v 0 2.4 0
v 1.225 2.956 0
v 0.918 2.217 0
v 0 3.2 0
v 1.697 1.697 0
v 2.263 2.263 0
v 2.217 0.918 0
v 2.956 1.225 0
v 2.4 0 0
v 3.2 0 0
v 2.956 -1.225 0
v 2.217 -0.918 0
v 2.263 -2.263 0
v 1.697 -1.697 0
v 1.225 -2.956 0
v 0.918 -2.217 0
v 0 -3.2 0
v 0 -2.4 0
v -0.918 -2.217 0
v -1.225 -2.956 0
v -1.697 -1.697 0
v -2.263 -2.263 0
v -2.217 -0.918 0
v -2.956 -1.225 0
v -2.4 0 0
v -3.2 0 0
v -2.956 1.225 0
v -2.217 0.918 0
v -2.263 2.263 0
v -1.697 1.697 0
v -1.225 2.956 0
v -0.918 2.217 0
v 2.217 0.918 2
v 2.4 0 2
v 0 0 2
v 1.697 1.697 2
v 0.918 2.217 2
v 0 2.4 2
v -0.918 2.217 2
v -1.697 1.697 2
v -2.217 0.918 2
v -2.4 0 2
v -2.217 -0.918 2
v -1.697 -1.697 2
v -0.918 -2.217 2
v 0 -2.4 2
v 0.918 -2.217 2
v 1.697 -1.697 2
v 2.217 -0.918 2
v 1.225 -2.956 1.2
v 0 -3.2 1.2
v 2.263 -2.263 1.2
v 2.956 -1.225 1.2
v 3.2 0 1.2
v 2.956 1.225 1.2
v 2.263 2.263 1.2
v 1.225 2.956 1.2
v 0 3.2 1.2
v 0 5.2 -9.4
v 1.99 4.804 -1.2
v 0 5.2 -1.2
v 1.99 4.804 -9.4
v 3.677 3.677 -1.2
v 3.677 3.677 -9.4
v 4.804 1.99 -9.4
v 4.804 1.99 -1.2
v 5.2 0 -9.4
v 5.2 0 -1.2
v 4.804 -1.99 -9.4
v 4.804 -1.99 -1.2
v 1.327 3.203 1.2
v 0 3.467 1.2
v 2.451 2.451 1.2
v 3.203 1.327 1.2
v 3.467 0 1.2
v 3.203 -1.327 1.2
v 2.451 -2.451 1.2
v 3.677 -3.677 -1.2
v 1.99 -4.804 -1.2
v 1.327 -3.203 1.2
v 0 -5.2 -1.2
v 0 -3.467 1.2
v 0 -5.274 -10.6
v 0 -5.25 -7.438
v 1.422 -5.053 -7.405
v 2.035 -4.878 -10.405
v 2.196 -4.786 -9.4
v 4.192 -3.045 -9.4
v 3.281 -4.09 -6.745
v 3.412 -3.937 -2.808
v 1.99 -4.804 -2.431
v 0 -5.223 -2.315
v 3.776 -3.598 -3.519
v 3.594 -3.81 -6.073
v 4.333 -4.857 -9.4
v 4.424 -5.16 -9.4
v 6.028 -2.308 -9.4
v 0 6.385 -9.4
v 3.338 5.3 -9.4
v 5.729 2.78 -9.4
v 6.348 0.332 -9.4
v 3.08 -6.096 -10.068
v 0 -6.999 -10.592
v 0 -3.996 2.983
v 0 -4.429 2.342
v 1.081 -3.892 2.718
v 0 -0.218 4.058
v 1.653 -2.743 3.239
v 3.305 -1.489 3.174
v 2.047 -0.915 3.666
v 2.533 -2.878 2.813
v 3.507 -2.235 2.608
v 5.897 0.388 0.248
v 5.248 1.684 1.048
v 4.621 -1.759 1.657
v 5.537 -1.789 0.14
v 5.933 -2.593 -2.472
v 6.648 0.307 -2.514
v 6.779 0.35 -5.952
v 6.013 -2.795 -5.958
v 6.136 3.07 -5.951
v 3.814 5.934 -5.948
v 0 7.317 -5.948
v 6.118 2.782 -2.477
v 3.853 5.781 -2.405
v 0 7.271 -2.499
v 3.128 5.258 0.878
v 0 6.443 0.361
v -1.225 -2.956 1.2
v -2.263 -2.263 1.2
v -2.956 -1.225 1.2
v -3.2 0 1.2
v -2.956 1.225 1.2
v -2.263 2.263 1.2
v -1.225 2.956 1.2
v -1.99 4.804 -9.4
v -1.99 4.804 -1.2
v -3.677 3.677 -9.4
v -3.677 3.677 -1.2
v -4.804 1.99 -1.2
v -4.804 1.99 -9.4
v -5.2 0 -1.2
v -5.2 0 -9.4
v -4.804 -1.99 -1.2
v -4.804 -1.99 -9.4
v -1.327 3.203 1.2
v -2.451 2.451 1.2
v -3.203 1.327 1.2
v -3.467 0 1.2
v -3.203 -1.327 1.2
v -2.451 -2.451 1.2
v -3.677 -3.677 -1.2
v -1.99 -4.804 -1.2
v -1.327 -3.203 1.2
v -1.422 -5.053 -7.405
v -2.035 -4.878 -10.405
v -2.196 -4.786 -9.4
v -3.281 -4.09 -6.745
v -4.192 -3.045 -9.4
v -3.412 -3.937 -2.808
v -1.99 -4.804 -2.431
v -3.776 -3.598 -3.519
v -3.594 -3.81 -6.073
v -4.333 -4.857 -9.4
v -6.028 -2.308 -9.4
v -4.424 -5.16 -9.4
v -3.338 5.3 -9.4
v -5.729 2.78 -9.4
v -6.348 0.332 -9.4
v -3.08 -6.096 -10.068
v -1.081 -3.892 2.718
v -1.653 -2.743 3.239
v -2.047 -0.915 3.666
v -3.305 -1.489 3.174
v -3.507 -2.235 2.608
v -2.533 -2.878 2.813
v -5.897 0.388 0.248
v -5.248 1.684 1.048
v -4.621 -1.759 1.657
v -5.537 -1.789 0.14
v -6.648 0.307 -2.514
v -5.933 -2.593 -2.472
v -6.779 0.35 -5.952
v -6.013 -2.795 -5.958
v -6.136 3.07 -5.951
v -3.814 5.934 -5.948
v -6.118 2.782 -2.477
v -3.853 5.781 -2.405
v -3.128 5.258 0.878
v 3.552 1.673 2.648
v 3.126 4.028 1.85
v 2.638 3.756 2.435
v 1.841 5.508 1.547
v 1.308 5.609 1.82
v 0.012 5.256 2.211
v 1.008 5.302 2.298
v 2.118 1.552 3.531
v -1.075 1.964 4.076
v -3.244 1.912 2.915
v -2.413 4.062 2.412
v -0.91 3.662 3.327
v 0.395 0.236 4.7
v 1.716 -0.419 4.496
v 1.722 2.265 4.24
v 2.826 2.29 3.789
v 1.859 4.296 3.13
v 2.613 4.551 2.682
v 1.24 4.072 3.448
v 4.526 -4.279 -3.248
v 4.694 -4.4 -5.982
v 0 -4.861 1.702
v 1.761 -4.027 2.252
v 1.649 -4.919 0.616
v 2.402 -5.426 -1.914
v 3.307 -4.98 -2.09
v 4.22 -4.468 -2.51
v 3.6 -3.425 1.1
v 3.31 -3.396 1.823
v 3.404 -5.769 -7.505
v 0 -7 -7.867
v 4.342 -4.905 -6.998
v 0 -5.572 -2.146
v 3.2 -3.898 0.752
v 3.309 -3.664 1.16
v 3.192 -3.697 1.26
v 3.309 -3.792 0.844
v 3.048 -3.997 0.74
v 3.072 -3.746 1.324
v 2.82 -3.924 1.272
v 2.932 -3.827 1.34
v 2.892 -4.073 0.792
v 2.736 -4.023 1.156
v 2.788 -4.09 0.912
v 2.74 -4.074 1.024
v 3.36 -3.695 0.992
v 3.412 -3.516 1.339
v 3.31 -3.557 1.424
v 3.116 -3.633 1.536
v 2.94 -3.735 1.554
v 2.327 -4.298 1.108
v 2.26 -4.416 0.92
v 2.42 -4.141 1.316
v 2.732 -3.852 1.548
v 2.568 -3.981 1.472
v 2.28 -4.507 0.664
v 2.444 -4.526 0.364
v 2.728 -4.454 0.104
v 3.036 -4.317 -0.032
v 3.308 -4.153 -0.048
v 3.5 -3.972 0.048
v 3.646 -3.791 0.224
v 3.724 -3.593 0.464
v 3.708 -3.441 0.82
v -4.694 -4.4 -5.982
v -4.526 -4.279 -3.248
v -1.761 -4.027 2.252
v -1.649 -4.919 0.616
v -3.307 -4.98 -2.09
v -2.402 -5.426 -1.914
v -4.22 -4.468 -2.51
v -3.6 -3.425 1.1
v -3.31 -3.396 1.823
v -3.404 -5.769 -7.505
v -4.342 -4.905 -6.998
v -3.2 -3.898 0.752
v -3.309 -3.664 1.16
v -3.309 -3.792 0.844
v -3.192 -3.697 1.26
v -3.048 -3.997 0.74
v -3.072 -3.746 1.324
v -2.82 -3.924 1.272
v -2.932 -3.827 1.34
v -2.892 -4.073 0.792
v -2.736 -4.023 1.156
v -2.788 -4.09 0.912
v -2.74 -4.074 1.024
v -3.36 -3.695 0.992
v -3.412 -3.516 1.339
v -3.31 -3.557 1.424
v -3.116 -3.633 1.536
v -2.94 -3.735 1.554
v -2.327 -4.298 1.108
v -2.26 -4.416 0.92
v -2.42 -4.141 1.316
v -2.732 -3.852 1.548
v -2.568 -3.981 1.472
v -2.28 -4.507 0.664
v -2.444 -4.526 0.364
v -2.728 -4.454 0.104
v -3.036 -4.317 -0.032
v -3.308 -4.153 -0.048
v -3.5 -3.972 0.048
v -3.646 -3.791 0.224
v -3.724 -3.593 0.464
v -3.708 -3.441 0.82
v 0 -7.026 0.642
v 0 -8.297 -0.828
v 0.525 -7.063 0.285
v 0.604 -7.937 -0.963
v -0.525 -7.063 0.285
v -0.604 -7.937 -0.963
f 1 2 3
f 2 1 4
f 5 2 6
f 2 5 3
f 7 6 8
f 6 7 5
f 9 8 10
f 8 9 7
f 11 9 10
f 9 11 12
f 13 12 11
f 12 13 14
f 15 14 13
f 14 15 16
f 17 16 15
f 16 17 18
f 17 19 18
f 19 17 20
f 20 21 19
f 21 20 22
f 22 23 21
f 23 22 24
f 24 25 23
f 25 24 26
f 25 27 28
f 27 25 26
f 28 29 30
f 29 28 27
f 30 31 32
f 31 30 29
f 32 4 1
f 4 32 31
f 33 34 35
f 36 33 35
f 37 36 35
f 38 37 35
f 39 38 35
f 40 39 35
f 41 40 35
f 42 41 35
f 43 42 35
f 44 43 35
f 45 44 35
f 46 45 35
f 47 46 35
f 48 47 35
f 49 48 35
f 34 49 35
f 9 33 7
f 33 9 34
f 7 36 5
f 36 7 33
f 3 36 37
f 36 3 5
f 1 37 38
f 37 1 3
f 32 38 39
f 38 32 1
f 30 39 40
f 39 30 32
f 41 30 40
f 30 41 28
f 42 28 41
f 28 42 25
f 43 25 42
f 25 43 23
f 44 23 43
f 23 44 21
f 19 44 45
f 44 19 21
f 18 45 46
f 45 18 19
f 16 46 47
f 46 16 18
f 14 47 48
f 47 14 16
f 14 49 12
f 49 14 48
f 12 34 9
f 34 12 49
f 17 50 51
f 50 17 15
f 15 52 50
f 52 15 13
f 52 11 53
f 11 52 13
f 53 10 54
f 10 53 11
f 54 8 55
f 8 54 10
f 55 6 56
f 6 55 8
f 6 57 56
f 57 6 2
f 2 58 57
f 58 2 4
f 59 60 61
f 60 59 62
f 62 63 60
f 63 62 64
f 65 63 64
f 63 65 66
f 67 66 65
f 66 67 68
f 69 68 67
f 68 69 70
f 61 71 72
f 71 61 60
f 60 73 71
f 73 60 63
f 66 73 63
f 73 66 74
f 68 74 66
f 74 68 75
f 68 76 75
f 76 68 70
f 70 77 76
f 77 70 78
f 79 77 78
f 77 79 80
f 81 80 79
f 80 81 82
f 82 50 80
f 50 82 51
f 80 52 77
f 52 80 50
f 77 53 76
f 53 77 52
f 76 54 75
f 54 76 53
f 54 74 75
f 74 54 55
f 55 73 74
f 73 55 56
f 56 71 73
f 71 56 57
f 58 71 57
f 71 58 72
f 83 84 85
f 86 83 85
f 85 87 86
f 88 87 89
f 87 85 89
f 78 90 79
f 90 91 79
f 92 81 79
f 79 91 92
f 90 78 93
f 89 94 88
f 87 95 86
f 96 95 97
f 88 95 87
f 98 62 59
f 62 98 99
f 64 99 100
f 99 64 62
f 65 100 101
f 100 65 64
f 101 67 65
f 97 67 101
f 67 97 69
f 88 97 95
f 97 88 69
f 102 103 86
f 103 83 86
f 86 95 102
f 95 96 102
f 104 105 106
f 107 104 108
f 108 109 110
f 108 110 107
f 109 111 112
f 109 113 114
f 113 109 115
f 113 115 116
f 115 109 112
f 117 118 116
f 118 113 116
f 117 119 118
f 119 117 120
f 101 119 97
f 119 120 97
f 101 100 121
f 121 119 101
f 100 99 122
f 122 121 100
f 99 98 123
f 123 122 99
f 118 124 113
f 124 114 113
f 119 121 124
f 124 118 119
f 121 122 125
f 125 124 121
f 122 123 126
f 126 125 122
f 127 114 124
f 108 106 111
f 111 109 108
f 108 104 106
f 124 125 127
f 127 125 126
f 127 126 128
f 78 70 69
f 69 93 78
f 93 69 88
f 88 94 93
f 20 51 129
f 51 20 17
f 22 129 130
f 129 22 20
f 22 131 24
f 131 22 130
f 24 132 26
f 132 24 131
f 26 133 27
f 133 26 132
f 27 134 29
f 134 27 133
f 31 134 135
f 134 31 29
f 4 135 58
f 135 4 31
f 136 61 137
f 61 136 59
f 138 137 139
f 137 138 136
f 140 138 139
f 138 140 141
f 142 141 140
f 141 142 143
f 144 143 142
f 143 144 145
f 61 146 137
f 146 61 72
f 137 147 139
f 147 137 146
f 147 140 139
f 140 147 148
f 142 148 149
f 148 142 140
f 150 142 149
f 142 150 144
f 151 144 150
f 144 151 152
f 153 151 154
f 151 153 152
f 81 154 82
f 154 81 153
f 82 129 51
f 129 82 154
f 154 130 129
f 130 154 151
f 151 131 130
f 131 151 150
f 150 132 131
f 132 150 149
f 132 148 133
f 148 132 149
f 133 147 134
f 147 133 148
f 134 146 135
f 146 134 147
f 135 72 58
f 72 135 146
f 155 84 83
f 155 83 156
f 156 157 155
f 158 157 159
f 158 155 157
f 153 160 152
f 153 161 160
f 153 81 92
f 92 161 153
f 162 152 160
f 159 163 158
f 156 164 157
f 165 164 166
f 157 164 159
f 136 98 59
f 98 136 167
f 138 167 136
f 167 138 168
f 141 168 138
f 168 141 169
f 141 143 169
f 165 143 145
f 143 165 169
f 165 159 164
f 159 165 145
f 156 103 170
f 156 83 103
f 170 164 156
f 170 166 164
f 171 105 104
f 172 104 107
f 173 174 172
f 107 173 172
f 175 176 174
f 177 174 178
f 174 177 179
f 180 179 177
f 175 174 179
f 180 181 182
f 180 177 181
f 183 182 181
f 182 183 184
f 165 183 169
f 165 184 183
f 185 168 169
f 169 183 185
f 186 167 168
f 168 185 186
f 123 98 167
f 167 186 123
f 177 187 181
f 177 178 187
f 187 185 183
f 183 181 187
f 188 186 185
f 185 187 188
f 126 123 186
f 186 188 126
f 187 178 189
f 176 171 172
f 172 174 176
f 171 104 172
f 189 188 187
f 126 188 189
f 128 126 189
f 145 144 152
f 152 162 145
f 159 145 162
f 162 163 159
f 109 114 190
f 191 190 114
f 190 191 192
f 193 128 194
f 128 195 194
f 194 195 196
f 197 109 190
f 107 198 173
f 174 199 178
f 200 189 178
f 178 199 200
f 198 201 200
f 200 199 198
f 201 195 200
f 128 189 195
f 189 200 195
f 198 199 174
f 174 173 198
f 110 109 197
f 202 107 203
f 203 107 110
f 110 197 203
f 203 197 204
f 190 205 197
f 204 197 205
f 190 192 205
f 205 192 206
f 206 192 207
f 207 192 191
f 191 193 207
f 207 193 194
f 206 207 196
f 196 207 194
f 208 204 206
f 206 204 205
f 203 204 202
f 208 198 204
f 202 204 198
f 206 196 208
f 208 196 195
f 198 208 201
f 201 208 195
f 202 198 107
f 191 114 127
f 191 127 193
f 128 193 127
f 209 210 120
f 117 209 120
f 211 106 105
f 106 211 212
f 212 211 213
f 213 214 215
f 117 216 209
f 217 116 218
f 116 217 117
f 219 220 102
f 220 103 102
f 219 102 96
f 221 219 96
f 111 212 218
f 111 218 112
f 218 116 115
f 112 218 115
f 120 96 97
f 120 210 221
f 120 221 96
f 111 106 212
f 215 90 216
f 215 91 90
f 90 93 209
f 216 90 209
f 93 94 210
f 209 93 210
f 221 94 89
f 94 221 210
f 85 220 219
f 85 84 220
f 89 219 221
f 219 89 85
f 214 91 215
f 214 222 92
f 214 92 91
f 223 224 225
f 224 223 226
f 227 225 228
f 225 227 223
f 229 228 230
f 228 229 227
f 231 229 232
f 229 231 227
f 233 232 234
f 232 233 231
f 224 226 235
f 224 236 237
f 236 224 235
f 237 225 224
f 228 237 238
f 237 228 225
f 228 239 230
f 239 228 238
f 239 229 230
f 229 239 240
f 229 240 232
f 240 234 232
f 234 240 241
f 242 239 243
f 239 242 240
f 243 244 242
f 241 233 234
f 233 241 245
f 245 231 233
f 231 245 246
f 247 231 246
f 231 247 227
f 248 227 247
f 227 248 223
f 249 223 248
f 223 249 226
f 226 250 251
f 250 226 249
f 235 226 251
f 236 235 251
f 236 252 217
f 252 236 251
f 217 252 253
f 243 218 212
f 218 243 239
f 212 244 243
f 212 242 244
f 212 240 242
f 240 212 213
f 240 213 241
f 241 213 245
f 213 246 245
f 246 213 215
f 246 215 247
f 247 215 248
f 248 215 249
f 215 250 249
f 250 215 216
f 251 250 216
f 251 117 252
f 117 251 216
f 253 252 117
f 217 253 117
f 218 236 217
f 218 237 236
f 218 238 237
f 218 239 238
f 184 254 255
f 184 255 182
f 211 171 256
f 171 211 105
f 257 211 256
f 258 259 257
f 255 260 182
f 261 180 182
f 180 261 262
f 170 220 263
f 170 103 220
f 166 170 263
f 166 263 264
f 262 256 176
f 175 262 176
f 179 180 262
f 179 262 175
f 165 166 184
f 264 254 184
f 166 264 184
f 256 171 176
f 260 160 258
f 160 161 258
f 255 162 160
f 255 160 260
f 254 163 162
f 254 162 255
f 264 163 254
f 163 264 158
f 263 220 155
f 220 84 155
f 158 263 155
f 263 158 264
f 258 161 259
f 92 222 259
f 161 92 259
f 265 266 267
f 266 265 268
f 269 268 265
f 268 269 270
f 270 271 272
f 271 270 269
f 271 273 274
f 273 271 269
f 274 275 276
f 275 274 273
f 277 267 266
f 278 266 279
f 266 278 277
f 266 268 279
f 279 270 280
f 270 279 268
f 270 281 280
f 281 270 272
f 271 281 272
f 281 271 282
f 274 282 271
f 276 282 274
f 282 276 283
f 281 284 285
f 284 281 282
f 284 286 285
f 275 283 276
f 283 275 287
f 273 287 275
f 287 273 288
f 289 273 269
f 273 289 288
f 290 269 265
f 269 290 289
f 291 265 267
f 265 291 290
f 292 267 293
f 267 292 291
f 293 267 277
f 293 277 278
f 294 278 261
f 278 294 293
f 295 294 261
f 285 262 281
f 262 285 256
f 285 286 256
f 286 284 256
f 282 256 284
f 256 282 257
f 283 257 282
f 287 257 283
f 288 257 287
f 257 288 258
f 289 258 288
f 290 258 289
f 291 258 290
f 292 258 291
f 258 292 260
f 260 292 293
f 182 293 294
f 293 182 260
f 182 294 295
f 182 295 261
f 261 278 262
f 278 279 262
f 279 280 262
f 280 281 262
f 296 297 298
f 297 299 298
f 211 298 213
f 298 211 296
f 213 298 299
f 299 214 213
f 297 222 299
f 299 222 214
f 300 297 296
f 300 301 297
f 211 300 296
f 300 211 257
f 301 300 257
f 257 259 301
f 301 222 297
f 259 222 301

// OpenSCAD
use <../lib.scad>
use <s/25971p01s01.scad>
use <s/25971s01.scad>
use <s/25971s02.scad>
use <s/25971s04.scad>
use <../p/stud4o.scad>
function ldraw_lib__25971p01() = [
// 0 Minifig Headdress Bird with Penguin White Face and Orange Beak Pattern
// 0 Name: 25971p01.dat
// 0 Author: Philippe Hurbain [Philo]
// 0 !LDRAW_ORG Part UPDATE 2022-01
// 0 !LICENSE Licensed under CC BY 2.0 and CC BY 4.0 : see CAreadme.txt
// 
// 0 BFC CERTIFY CCW
  [0,"BFC","CERTIFY"],
  [0,"BFC","CCW"],
// 
// 0 !CATEGORY Minifig Headwear
// 0 !KEYWORDS Series 16, Suit, Winter Hut
// 
// 0 !HISTORY 2016-10-05 {LEGO Digital Designer} Original part shape
// 0 !HISTORY 2019-05-19 [Philo] File preparation for LDraw Parts Tracker
// 0 !HISTORY 2022-01-14 [PTadmin] Official Update 2022-01
// 
// 
// 1 16 0 -5 0 -1 0 0 0 -1.25 0 0 0 1 stud4o.dat
  [1,16,0,-5,0,-1,0,0,0,-1.25,0,0,0,1, ldraw_lib__stud4o()],
// 1 16 0 0 0 1 0 0 0 1 0 0 0 1 s\25971s01.dat
  [1,16,0,0,0,1,0,0,0,1,0,0,0,1, ldraw_lib__s__25971s01()],
// 1 16 0 0 0 -1 0 0 0 1 0 0 0 1 s\25971s01.dat
  [1,16,0,0,0,-1,0,0,0,1,0,0,0,1, ldraw_lib__s__25971s01()],
// 1 16 0 0 0 1 0 0 0 1 0 0 0 1 s\25971s02.dat
  [1,16,0,0,0,1,0,0,0,1,0,0,0,1, ldraw_lib__s__25971s02()],
// 1 15 0 0 0 1 0 0 0 1 0 0 0 1 s\25971p01s01.dat
  [1,15,0,0,0,1,0,0,0,1,0,0,0,1, ldraw_lib__s__25971p01s01()],
// 1 15 0 0 0 -1 0 0 0 1 0 0 0 1 s\25971p01s01.dat
  [1,15,0,0,0,-1,0,0,0,1,0,0,0,1, ldraw_lib__s__25971p01s01()],
// 1 25 0 0 0 1 0 0 0 1 0 0 0 1 s\25971s04.dat
  [1,25,0,0,0,1,0,0,0,1,0,0,0,1, ldraw_lib__s__25971s04()],
// 1 25 0 0 0 -1 0 0 0 1 0 0 0 1 s\25971s04.dat
  [1,25,0,0,0,-1,0,0,0,1,0,0,0,1, ldraw_lib__s__25971s04()],
];
makepoly(ldraw_lib__25971p01(), line=0.2);
